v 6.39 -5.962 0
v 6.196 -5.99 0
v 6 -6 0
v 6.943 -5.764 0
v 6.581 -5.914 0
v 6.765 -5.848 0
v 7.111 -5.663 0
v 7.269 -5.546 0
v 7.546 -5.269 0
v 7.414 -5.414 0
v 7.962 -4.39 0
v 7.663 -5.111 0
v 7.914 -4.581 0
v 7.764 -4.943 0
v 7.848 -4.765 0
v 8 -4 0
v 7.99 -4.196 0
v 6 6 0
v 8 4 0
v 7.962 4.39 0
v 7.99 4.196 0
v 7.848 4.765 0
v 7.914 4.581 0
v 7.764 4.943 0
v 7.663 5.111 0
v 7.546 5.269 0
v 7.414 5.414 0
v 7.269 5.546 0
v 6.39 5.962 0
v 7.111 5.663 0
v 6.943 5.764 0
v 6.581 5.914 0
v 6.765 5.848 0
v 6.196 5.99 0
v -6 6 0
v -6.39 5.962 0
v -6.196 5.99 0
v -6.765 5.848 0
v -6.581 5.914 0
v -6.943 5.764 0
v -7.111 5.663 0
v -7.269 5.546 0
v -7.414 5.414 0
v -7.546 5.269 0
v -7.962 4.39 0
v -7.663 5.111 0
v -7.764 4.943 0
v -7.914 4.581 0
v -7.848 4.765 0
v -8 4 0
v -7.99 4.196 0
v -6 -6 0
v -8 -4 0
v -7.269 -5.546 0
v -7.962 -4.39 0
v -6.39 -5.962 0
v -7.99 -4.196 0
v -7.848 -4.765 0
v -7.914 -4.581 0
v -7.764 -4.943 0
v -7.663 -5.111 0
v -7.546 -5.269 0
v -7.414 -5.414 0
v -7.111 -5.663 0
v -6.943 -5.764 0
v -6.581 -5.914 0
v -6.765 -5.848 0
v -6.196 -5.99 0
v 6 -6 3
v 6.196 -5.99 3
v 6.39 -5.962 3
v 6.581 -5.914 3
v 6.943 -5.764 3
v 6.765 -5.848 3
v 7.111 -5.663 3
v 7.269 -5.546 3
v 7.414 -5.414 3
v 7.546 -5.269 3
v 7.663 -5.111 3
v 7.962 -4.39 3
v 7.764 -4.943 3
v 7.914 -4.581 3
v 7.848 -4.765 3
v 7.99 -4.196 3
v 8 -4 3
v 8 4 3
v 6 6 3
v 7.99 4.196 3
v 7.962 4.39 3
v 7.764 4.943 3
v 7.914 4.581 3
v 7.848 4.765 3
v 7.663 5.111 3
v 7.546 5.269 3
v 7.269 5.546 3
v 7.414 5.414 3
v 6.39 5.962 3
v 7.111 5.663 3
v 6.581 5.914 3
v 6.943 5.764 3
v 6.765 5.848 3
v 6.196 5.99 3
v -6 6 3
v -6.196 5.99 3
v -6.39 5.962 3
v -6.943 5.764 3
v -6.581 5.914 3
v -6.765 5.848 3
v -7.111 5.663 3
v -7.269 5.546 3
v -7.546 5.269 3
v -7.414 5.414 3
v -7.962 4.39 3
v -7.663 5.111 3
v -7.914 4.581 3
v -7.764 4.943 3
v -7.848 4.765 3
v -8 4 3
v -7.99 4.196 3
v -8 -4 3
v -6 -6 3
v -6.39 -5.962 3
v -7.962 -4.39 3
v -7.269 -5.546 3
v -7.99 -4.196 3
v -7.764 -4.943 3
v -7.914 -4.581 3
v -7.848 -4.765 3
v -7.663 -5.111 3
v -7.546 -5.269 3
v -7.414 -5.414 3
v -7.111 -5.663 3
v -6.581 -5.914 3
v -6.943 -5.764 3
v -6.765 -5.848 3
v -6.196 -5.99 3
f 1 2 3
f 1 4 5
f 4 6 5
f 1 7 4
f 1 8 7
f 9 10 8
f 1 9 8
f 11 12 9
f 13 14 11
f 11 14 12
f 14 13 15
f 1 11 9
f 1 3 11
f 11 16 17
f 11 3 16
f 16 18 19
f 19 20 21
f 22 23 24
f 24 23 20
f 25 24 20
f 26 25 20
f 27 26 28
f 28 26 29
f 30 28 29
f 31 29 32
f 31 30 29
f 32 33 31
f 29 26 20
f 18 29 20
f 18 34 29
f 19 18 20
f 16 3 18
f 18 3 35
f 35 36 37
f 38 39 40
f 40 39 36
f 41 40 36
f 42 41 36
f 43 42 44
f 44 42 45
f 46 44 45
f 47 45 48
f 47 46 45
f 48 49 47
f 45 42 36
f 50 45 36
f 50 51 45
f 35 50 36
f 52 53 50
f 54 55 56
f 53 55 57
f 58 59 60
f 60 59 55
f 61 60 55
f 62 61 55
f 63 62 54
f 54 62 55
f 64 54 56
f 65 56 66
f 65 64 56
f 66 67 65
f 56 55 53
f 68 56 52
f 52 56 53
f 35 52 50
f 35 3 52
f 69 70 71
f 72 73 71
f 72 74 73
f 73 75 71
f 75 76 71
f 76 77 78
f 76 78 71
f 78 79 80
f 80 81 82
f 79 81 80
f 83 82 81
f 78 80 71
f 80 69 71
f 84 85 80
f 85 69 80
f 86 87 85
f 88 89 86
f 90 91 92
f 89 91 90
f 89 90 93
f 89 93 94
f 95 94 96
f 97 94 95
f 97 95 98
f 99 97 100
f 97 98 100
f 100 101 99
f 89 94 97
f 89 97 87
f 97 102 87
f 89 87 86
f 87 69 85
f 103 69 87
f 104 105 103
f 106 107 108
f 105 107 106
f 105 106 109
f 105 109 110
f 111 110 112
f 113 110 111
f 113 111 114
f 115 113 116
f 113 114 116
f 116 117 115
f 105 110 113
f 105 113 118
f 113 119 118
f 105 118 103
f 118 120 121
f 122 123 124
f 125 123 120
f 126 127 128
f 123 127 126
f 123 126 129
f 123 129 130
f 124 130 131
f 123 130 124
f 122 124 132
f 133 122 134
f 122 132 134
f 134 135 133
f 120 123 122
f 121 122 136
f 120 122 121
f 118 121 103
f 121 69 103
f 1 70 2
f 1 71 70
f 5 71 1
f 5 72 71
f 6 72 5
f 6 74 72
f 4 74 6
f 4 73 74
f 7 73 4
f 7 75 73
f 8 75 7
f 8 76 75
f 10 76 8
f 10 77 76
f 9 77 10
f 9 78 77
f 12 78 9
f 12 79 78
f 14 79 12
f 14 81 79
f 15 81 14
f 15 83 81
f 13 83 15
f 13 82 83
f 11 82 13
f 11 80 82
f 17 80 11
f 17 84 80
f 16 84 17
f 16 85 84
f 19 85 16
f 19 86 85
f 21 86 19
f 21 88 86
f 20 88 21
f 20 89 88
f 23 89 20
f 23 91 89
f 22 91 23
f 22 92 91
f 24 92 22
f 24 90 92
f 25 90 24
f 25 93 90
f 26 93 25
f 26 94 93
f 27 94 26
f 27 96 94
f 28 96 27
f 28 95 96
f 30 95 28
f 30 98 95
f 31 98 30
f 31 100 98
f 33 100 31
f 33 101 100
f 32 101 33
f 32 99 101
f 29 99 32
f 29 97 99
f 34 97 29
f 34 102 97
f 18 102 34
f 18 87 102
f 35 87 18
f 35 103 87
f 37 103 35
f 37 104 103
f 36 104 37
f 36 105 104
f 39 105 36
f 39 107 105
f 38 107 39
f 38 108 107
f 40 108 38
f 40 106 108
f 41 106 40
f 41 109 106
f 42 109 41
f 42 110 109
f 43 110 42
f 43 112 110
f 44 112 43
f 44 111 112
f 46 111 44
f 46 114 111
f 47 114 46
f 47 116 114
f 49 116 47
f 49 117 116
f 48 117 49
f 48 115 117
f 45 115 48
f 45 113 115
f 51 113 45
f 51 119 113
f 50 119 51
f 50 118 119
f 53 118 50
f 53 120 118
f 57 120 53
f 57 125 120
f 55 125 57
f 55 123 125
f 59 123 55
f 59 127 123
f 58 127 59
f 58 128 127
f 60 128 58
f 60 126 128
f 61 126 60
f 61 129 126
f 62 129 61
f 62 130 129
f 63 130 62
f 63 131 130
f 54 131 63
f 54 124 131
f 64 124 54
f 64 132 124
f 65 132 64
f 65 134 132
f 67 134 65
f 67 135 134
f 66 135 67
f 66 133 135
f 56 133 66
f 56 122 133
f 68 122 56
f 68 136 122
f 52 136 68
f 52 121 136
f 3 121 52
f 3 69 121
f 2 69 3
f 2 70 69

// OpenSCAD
// file: ../lib/util.scad
// =============================================================================
// lib/util.scad — reusable 2D/3D helpers. All "cutter" modules are sized to
// over-shoot in Z so callers can subtract them cleanly; callers position them.
// Self-contained: `use <util.scad>` imports only modules, not variables, so we
// define our own over-cut constant here rather than relying on params.scad.
// =============================================================================

eps = 0.05;   // local over-cut for clean boolean subtractions

// ---- 2D primitives ----------------------------------------------------------

// Rounded rectangle centered at origin. r=0 -> sharp corners.
module rounded_rect(w, d, r = 0) {
    if (r > 0)
        offset(r = r) square([max(0.01, w - 2*r), max(0.01, d - 2*r)], center = true);
    else
        square([w, d], center = true);
}

// Isosceles trapezoid centered at origin: width w1 at the -X end, w2 at the +X
// end, length l along X. Used for the dovetail arm root + its mating pocket so
// the two always share one profile (call with +clearance for the pocket).
module trapezoid_2d(w1, w2, l) {
    polygon([[-l/2, -w1/2], [-l/2, w1/2], [l/2, w2/2], [l/2, -w2/2]]);
}

// Stadium slot: length l along X, width w along Y, fully rounded ends.
module slot_2d(l, w) {
    r = w / 2;
    hull() {
        translate([-(l/2 - r), 0]) circle(r = r);
        translate([ (l/2 - r), 0]) circle(r = r);
    }
}

// Inset-fillet a 2D shape: rounds BOTH convex and concave corners by radius r.
// Used for the arm root where the body blends into the clamp pad.
module fillet_2d(r) {
    offset(r = r) offset(delta = -r) children();
}

// ---- 3D solids --------------------------------------------------------------

// Flat plate: rounded rectangle, centered in XY, base on z=0.
module rounded_plate(w, d, h, r = 0) {
    linear_extrude(height = h) rounded_rect(w, d, r);
}

// ---- Cutters (subtract these) ----------------------------------------------

// Single through-hole, base on z=0, height h (caller lifts by -eps and pads h).
module hole(d, h) {
    translate([0, 0, -eps]) cylinder(d = d, h = h + 2*eps);
}

// 4-hole rectangular bolt pattern, spacing dx by dy, through a part of height h.
module bolt_grid(dx, dy, d, h) {
    for (x = [-dx/2, dx/2], y = [-dy/2, dy/2])
        translate([x, y, 0]) hole(d, h);
}

// 2-hole pair separated by `sep` along X (used for arm clamp / mast / cam).
module bolt_pair(sep, d, h) {
    for (x = [-sep/2, sep/2]) translate([x, 0, 0]) hole(d, h);
}

// Rounded-end through slot, length l along X.
module slot_cut(l, w, h) {
    translate([0, 0, -eps]) linear_extrude(height = h + 2*eps) slot_2d(l, w);
}

// Rectangular through cutout (window / strap slot), optional corner radius.
module rect_cut(l, w, h, r = 0) {
    translate([0, 0, -eps]) linear_extrude(height = h + 2*eps) rounded_rect(l, w, r);
}

// Shallow rectangular pocket cut DOWNWARD from the top face at z = top_z.
module pocket(l, w, depth, top_z, r = 0) {
    translate([0, 0, top_z - depth])
        linear_extrude(height = depth + eps) rounded_rect(l, w, r);
}

// Recess an arbitrary 2D child profile DOWN from the top face at z = top_z.
module recess_top(depth, top_z) {
    translate([0, 0, top_z - depth])
        linear_extrude(height = depth + eps) children();
}

// Recess an arbitrary 2D child profile UP from the bottom face (z = 0).
module recess_bottom(depth) {
    translate([0, 0, -eps])
        linear_extrude(height = depth + eps) children();
}

// Sensor-board seat: a rounded recess (captures the board by geometry, matching
// its rounded corners) plus two through mounting holes on the centerline.
// Subtract from a carrier of total thickness `h_total`, top face at `top_z`.
module board_cradle(l, w, r, depth, top_z, hole_d, hole_sep, h_total) {
    recess_top(depth, top_z) rounded_rect(l, w, r);
    for (x = [-hole_sep/2, hole_sep/2]) translate([x, 0, 0]) hole(hole_d, h_total);
}
// main file
// IMU TPU Damping Pad — print in flexible TPU (~95A).
// Sits in the IMU mount's central recess; the ICM-20948 VHB-tapes to its top.
// Soft TPU decouples the IMU from frame/motor vibration (the standard FC trick),
// and being smaller than the board it leaves the STEMMA ports / pins exposed.
include <../params.scad>
use <../lib/util.scad>

module imu_tpu_pad() {
    rounded_plate(imu_pad_l, imu_pad_w, imu_pad_h, 2);
}

imu_tpu_pad();
